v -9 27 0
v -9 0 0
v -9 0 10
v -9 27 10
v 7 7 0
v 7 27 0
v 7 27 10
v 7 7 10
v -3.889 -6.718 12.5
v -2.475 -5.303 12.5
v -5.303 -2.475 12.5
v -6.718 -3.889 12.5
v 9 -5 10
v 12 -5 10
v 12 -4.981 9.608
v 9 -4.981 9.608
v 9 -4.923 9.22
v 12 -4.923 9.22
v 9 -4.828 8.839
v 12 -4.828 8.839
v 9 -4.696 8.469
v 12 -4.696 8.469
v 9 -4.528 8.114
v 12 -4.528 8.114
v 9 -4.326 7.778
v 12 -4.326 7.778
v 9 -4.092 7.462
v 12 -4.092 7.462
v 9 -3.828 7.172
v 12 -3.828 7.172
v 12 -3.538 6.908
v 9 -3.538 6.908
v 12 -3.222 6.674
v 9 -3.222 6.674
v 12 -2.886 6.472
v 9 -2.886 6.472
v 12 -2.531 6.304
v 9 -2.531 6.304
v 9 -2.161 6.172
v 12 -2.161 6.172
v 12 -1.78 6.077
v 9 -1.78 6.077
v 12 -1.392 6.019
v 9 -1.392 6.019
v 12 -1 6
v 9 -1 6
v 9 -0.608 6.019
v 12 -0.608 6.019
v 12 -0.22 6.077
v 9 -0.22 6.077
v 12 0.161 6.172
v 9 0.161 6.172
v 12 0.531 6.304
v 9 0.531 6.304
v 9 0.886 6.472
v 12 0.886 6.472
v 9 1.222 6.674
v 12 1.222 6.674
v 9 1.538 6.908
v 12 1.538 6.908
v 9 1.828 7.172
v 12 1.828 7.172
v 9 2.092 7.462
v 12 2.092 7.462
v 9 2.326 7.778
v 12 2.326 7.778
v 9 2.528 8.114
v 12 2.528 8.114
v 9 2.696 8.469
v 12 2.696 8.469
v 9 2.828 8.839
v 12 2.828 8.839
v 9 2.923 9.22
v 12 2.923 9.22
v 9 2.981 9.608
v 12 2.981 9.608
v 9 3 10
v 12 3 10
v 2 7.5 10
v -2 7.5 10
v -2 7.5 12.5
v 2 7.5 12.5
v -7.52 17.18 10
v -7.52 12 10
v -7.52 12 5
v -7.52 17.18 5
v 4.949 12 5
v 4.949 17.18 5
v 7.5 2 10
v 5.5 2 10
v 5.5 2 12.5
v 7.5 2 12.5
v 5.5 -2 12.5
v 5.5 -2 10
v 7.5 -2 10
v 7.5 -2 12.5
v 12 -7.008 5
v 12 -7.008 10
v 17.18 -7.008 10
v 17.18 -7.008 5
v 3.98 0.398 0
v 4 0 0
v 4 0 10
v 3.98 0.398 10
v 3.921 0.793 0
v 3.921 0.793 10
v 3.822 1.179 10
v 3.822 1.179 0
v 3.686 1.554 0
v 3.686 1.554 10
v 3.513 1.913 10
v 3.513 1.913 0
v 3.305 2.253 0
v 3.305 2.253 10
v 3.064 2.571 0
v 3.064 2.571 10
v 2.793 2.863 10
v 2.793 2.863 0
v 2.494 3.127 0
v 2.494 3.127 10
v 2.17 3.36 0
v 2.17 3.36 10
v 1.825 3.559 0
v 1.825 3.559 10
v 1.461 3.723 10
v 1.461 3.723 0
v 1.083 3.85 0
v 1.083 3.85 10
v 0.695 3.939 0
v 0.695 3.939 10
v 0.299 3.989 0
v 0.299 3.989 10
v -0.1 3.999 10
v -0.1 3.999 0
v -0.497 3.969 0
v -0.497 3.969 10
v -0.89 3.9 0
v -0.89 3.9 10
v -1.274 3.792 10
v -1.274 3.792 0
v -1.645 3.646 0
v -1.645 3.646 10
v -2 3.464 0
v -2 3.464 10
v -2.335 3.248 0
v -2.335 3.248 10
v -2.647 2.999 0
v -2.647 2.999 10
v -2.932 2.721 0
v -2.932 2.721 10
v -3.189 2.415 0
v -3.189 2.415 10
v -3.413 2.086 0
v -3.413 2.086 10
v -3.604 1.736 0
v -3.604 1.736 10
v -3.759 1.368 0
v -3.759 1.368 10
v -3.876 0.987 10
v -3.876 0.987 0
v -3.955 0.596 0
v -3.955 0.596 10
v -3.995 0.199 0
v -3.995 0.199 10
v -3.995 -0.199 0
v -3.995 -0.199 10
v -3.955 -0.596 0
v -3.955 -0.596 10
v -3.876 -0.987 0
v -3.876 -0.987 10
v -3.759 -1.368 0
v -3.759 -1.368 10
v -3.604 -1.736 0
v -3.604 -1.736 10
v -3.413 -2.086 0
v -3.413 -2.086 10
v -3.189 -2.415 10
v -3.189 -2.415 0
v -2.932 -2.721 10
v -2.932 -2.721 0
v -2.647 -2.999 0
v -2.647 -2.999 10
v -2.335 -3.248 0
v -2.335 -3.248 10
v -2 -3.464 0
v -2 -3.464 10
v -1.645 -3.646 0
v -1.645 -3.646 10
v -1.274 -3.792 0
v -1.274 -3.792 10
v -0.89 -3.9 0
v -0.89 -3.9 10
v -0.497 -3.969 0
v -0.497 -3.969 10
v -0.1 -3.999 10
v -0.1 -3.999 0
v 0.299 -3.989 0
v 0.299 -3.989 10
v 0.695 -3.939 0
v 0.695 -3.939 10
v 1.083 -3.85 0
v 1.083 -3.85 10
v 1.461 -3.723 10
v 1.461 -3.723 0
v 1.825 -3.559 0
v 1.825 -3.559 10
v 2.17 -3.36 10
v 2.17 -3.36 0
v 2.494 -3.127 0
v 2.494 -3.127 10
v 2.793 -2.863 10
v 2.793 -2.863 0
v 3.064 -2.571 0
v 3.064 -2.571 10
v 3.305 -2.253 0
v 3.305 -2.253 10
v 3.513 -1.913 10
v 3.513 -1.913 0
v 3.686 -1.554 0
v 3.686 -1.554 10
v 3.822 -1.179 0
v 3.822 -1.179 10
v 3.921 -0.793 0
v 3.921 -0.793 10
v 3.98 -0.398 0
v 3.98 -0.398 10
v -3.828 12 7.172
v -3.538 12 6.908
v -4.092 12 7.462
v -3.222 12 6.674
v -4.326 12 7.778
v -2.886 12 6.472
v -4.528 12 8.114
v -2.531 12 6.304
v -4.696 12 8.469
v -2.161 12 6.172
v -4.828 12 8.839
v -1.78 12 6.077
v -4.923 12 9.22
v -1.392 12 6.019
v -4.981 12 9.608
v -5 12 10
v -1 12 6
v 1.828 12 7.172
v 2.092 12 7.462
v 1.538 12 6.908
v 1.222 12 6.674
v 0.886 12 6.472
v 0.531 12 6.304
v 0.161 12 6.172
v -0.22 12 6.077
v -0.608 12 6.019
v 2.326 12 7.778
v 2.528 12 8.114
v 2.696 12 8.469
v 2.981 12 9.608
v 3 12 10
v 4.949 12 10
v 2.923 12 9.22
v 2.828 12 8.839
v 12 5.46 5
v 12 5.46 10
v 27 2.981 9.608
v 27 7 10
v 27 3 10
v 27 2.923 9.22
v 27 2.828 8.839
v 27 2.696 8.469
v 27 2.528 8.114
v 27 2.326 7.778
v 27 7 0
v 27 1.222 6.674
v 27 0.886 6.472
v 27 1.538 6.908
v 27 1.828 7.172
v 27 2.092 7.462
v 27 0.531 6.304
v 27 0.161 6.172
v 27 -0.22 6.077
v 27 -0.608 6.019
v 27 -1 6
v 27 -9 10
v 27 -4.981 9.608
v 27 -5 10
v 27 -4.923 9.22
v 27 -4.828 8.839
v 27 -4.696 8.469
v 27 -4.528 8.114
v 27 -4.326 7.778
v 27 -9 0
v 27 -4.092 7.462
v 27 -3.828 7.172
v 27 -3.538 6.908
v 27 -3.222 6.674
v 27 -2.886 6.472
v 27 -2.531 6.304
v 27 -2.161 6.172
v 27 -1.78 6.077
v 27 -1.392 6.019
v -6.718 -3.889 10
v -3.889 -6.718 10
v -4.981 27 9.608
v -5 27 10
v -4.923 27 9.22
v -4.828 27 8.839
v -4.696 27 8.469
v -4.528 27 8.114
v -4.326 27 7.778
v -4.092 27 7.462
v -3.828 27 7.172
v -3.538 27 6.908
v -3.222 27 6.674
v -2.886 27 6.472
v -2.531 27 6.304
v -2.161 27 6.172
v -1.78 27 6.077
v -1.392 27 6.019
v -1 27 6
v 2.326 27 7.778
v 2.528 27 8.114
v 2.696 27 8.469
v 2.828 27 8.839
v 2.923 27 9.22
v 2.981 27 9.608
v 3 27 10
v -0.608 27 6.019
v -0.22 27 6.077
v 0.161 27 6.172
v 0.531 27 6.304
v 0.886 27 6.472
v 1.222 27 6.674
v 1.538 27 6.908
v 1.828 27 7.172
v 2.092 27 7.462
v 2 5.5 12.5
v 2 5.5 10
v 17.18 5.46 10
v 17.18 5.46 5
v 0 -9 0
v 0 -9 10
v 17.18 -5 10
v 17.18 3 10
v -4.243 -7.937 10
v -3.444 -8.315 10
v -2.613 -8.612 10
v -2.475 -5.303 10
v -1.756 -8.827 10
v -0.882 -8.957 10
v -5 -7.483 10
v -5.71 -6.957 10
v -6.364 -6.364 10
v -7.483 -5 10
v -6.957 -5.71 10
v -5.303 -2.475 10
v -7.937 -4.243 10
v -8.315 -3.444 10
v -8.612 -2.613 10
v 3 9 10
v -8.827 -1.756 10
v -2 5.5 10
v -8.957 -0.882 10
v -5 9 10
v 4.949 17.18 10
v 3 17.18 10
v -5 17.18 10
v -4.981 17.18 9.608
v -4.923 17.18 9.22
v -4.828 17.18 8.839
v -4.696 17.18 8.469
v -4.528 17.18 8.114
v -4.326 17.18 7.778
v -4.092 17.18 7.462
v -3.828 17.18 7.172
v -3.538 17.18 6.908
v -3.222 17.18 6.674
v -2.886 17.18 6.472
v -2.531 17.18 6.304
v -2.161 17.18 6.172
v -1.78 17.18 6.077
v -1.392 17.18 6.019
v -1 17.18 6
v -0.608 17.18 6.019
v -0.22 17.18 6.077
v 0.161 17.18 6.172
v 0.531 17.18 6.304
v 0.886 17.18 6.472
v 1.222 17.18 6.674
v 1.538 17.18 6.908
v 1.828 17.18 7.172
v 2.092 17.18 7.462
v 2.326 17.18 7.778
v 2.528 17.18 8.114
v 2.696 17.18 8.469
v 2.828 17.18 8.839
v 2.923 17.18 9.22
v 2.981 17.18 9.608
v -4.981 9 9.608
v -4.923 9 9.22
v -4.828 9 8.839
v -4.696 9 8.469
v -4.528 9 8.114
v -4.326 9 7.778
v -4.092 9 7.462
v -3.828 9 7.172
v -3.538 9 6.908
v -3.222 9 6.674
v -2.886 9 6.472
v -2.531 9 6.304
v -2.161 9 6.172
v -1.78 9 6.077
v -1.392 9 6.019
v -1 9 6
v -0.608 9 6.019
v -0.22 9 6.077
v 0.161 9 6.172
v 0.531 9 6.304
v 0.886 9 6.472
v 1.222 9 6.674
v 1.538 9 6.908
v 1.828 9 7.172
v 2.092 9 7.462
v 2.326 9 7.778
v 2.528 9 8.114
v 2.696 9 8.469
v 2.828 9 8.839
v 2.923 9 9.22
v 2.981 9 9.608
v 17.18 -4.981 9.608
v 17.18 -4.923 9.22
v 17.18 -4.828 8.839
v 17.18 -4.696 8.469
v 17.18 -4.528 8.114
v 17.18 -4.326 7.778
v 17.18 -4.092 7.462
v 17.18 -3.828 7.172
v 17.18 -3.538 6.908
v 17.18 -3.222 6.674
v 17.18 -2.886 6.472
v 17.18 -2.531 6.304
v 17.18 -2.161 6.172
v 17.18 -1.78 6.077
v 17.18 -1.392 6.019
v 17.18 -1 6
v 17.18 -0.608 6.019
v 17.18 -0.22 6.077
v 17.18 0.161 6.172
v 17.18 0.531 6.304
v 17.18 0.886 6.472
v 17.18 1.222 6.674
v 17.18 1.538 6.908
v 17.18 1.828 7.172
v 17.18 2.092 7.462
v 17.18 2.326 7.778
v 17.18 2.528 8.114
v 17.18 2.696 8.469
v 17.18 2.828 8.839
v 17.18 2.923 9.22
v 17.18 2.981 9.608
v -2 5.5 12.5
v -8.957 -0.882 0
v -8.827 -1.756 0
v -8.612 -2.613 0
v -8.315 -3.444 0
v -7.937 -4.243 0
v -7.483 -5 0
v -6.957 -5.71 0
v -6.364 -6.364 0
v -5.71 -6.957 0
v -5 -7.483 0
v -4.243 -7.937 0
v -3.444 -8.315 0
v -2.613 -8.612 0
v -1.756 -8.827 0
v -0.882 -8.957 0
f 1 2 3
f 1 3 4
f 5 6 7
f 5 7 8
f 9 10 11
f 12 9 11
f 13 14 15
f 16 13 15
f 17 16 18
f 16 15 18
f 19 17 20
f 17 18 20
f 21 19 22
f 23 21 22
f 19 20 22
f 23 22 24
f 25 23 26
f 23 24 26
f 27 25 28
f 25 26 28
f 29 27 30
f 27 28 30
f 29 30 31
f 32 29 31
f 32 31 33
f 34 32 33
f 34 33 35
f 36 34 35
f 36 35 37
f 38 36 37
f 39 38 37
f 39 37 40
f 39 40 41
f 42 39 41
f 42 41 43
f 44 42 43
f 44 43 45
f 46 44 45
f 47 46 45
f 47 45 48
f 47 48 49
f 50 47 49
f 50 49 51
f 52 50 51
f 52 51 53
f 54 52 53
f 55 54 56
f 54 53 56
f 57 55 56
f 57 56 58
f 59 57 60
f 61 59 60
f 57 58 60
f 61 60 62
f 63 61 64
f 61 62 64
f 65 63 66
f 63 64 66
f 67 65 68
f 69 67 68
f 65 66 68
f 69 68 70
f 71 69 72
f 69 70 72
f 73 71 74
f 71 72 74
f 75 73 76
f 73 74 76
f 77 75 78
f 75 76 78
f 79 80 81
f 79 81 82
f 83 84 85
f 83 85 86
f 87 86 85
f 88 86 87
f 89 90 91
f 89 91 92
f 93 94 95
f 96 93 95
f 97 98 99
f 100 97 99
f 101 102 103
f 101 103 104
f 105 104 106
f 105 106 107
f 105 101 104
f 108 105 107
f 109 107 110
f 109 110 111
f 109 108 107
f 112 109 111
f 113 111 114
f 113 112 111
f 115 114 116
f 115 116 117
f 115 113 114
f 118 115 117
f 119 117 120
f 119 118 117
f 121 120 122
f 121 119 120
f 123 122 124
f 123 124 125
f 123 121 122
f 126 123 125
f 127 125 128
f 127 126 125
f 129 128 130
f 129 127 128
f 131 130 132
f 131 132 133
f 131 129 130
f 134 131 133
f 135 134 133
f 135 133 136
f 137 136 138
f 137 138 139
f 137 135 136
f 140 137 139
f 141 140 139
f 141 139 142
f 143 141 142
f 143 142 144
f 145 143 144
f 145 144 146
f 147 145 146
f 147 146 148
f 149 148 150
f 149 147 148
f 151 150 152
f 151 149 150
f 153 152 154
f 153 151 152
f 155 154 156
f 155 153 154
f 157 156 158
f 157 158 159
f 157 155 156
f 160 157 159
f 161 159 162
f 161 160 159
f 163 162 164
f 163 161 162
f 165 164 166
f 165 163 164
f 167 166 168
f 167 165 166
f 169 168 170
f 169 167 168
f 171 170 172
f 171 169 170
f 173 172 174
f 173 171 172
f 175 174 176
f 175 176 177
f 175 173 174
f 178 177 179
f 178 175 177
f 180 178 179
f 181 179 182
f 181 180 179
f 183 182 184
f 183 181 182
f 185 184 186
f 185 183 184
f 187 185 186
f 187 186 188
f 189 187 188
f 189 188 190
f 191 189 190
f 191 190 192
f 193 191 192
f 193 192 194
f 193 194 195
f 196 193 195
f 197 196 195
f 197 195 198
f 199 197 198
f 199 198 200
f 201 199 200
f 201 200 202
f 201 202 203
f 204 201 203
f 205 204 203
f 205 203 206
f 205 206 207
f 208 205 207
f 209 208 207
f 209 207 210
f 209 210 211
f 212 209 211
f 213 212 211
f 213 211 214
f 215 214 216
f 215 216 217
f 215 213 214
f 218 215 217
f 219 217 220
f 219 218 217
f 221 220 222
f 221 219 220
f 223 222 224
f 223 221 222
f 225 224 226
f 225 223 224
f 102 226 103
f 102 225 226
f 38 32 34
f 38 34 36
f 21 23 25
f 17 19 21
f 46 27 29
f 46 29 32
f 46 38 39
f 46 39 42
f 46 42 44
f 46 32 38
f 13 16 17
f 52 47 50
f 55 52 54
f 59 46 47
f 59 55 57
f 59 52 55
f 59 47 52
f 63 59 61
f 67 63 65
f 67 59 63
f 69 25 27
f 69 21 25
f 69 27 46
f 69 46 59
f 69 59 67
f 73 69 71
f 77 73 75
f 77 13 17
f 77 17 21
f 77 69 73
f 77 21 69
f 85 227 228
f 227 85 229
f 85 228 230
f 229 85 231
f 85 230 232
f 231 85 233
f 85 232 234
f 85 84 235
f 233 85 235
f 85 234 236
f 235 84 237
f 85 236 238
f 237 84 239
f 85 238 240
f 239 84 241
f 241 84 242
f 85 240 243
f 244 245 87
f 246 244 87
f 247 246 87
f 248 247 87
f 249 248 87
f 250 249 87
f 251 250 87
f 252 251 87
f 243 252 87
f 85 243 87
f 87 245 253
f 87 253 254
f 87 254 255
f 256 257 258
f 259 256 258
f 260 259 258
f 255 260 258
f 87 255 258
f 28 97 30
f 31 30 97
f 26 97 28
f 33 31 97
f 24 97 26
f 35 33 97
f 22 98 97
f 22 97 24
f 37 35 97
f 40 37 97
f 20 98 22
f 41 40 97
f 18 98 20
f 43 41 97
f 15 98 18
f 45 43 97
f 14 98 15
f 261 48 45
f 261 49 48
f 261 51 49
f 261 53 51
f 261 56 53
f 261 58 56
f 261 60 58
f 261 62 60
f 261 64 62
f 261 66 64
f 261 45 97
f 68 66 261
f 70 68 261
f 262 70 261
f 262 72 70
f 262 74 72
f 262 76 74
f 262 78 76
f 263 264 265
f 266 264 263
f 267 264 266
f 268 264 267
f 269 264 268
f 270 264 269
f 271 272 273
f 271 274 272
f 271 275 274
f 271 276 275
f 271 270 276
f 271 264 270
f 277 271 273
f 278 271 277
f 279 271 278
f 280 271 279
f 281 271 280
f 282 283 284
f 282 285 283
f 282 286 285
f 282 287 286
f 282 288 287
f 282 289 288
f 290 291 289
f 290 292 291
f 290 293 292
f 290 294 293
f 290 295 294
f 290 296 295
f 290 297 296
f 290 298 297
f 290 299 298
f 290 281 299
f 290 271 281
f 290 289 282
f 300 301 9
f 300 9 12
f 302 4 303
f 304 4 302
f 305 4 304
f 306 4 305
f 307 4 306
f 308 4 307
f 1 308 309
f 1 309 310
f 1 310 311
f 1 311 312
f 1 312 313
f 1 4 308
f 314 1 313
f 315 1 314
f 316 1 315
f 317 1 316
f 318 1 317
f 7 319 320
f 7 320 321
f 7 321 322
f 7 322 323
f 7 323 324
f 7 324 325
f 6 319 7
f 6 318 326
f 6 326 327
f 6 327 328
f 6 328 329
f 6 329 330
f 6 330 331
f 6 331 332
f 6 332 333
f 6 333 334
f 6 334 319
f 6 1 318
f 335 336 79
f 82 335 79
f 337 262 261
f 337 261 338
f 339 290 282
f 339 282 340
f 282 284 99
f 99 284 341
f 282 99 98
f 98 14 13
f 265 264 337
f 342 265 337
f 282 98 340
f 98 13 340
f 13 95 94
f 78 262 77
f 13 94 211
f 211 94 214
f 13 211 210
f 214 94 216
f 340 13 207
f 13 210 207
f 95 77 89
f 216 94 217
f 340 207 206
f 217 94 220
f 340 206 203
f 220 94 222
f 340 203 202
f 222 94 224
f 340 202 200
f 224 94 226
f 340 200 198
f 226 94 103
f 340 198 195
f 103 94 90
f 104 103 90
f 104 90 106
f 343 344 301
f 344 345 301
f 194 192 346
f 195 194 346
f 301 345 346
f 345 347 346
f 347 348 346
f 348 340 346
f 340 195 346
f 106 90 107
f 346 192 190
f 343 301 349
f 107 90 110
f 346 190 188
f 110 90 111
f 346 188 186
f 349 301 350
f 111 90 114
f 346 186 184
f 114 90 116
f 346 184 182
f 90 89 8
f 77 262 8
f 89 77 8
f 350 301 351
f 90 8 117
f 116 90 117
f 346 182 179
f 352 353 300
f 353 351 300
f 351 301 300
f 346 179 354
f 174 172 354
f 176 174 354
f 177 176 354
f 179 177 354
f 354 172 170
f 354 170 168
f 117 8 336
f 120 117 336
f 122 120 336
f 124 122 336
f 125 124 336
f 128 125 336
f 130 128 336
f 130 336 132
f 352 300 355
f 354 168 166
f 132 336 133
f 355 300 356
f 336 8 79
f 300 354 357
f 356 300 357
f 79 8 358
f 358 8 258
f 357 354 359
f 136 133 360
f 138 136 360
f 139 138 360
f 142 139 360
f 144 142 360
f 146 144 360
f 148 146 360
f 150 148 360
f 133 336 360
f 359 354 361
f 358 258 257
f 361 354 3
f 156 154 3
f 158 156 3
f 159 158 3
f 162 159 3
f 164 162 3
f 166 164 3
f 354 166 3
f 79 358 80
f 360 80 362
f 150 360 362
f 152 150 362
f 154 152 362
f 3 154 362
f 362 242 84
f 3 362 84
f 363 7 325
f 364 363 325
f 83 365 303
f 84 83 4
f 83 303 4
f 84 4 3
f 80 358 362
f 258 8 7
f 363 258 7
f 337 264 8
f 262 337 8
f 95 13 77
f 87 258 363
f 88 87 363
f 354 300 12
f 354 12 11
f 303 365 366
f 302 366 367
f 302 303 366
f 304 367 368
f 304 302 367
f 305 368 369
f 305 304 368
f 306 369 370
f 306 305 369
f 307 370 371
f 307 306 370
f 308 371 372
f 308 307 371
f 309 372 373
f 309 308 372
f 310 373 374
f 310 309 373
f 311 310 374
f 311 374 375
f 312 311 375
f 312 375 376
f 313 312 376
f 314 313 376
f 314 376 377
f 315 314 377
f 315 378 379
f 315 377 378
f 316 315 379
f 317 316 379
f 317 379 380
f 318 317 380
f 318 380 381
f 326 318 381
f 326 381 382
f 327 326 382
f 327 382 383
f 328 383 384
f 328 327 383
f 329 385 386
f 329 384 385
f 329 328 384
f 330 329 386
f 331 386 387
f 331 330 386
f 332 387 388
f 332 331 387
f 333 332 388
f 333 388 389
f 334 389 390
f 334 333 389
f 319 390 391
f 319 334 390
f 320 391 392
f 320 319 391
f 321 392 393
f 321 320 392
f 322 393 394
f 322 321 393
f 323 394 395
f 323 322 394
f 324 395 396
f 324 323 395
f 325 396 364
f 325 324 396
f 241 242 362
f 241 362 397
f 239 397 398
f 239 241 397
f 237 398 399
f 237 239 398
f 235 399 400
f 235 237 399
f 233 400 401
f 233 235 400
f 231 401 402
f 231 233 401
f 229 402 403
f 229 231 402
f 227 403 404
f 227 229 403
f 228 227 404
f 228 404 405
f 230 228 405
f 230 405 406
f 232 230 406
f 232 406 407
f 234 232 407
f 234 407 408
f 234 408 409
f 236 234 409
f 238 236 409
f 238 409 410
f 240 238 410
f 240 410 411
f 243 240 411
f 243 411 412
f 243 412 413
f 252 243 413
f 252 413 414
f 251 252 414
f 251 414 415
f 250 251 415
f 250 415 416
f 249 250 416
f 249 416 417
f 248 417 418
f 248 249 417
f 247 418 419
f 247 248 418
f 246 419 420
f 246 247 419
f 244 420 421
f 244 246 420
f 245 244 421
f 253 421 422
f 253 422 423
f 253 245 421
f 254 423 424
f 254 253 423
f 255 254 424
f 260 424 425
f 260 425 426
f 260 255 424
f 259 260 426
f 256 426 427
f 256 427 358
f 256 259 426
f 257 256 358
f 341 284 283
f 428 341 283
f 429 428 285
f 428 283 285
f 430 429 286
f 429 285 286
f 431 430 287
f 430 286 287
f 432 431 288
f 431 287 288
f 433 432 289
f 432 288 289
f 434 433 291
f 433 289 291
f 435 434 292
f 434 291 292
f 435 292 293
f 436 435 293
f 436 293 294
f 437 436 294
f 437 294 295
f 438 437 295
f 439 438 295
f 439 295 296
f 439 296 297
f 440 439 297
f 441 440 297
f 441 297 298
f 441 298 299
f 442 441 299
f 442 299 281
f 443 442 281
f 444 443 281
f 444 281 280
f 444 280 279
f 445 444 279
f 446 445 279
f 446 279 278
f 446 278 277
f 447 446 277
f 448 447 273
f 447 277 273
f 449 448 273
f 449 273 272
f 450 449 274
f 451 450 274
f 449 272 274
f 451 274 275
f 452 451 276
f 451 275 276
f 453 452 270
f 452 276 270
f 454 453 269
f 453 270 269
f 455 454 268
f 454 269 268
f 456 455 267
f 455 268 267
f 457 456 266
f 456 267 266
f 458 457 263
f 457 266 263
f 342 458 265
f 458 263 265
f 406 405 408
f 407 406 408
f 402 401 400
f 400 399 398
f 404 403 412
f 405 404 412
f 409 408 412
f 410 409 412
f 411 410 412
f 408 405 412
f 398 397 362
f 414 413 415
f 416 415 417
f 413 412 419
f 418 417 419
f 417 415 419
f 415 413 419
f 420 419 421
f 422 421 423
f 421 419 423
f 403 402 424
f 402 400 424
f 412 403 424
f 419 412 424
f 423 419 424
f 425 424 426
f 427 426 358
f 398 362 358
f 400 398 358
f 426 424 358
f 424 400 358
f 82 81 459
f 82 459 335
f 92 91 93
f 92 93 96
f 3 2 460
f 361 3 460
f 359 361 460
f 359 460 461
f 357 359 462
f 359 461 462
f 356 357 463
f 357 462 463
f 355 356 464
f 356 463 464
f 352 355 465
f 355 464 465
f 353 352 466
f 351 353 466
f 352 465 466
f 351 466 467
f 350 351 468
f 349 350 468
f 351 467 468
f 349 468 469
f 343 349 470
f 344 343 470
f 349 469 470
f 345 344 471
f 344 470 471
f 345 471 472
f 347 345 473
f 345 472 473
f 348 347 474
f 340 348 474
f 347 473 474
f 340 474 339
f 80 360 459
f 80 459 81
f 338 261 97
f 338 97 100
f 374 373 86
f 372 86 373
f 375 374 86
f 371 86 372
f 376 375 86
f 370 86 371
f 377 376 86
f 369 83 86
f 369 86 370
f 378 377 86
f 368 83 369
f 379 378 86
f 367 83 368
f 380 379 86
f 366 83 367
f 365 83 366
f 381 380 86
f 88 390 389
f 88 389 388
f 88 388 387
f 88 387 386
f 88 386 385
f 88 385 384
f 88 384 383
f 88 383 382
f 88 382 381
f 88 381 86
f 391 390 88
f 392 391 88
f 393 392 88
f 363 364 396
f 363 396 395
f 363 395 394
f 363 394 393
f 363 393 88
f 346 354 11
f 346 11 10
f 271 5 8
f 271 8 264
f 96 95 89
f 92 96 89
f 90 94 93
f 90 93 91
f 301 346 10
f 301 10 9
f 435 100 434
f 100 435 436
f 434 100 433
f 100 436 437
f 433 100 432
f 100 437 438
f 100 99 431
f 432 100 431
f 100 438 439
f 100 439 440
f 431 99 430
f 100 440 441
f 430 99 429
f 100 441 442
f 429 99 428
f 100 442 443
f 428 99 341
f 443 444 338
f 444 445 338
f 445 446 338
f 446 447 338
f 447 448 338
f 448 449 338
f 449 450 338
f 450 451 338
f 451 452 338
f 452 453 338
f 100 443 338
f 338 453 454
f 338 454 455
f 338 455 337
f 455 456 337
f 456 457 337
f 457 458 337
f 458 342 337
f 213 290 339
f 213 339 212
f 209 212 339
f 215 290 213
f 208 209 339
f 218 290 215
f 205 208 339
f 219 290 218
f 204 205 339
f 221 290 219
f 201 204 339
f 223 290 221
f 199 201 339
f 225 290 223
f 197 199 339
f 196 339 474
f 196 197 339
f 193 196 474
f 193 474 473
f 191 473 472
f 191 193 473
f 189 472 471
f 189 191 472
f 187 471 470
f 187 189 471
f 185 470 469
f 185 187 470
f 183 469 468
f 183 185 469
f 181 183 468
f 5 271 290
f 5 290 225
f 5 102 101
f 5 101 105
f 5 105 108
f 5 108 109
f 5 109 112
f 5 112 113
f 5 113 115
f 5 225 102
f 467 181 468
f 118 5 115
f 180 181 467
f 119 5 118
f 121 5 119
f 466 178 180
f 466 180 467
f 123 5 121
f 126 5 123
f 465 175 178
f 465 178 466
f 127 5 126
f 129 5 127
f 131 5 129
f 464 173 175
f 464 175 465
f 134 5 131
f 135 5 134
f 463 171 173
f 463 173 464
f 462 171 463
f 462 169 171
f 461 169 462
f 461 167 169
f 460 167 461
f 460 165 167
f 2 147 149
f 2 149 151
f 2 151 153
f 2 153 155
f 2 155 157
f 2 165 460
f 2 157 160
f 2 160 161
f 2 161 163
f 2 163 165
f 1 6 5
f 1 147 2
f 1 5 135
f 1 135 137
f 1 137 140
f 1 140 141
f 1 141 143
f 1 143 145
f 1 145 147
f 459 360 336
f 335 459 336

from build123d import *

# Parameters (mm, degrees)
SKETCH002_R   = 4
PAD002_DEPTH  = 18
SKETCH001_R   = 4
PAD001_DEPTH  = 18
SKETCH003_W   = 12.468703
SKETCH003_H   = 5.180136
SKETCH003_W_2 = 5.180136
SKETCH003_H_2 = 12.468704
PAD003_DEPTH  = 5
SKETCH004_W   = 4
SKETCH004_H   = 2
SKETCH004_W_2 = 2
SKETCH004_H_2 = 4
PAD004_DEPTH  = 2.5
SKETCH_R      = 4
PAD_DEPTH     = 10


with BuildPart() as mount002:
    # Sketch002 → Pad002 (new body)
    with BuildSketch(Plane.XZ.offset(-27)):
        with Locations((-1, 10)):
            Circle(SKETCH002_R)
    extrude(amount=PAD002_DEPTH)


with BuildPart() as mount001:
    # Sketch001 → Pad001 (new body)
    with BuildSketch(Plane.YZ.offset(27)):
        with Locations((-1, 10)):
            Circle(SKETCH001_R)
    extrude(amount=-PAD001_DEPTH)


with BuildPart() as cutblock:
    # Sketch003 → Pad003 (new body)
    with BuildSketch(Plane.XY.offset(10)):
        with Locations((-1.285158, 14.590068)):
            Rectangle(SKETCH003_W, SKETCH003_H)
        with Locations((14.590068, -0.774081)):
            Rectangle(SKETCH003_W_2, SKETCH003_H_2)
    extrude(amount=-PAD003_DEPTH)

    # Fusion001: union Mount002, Mount001
    add(mount002.part)
    add(mount001.part)


with BuildPart() as clip:
    # Sketch004 → Pad004 (new body)
    with BuildSketch(Plane.XY.offset(10)):
        with Locations((0, 6.5)):
            Rectangle(SKETCH004_W, SKETCH004_H)
        with Locations((6.5, 0)):
            Rectangle(SKETCH004_W_2, SKETCH004_H_2)
        Polygon((-6.717514, -3.889087), (-5.303301, -2.474874), (-2.474874, -5.303301), (-3.889087, -6.717514), align=None)
    extrude(amount=PAD004_DEPTH)


with BuildPart() as cut:
    # Sketch → Pad (new body)
    with BuildSketch(Plane.XY):
        with BuildLine():
            Line((-9, 3.6e-05), (-9, 27))
            Line((-9, 27), (7, 27))
            Line((7, 27), (7, 7))
            Line((7, 7), (27, 7))
            Line((27, 7), (27, -9))
            Line((27, -9), (3.6e-05, -9))
            ThreePointArc((-9, 3.6e-05), (-6.363961, -6.363961), (3.6e-05, -9))
        make_face()
        Circle(SKETCH_R, mode=Mode.SUBTRACT)
    extrude(amount=PAD_DEPTH)

    # Fusion: union Clip
    add(clip.part)

    # Cut: cut CutBlock
    add(cutblock.part, mode=Mode.SUBTRACT)


solid = cut.part
